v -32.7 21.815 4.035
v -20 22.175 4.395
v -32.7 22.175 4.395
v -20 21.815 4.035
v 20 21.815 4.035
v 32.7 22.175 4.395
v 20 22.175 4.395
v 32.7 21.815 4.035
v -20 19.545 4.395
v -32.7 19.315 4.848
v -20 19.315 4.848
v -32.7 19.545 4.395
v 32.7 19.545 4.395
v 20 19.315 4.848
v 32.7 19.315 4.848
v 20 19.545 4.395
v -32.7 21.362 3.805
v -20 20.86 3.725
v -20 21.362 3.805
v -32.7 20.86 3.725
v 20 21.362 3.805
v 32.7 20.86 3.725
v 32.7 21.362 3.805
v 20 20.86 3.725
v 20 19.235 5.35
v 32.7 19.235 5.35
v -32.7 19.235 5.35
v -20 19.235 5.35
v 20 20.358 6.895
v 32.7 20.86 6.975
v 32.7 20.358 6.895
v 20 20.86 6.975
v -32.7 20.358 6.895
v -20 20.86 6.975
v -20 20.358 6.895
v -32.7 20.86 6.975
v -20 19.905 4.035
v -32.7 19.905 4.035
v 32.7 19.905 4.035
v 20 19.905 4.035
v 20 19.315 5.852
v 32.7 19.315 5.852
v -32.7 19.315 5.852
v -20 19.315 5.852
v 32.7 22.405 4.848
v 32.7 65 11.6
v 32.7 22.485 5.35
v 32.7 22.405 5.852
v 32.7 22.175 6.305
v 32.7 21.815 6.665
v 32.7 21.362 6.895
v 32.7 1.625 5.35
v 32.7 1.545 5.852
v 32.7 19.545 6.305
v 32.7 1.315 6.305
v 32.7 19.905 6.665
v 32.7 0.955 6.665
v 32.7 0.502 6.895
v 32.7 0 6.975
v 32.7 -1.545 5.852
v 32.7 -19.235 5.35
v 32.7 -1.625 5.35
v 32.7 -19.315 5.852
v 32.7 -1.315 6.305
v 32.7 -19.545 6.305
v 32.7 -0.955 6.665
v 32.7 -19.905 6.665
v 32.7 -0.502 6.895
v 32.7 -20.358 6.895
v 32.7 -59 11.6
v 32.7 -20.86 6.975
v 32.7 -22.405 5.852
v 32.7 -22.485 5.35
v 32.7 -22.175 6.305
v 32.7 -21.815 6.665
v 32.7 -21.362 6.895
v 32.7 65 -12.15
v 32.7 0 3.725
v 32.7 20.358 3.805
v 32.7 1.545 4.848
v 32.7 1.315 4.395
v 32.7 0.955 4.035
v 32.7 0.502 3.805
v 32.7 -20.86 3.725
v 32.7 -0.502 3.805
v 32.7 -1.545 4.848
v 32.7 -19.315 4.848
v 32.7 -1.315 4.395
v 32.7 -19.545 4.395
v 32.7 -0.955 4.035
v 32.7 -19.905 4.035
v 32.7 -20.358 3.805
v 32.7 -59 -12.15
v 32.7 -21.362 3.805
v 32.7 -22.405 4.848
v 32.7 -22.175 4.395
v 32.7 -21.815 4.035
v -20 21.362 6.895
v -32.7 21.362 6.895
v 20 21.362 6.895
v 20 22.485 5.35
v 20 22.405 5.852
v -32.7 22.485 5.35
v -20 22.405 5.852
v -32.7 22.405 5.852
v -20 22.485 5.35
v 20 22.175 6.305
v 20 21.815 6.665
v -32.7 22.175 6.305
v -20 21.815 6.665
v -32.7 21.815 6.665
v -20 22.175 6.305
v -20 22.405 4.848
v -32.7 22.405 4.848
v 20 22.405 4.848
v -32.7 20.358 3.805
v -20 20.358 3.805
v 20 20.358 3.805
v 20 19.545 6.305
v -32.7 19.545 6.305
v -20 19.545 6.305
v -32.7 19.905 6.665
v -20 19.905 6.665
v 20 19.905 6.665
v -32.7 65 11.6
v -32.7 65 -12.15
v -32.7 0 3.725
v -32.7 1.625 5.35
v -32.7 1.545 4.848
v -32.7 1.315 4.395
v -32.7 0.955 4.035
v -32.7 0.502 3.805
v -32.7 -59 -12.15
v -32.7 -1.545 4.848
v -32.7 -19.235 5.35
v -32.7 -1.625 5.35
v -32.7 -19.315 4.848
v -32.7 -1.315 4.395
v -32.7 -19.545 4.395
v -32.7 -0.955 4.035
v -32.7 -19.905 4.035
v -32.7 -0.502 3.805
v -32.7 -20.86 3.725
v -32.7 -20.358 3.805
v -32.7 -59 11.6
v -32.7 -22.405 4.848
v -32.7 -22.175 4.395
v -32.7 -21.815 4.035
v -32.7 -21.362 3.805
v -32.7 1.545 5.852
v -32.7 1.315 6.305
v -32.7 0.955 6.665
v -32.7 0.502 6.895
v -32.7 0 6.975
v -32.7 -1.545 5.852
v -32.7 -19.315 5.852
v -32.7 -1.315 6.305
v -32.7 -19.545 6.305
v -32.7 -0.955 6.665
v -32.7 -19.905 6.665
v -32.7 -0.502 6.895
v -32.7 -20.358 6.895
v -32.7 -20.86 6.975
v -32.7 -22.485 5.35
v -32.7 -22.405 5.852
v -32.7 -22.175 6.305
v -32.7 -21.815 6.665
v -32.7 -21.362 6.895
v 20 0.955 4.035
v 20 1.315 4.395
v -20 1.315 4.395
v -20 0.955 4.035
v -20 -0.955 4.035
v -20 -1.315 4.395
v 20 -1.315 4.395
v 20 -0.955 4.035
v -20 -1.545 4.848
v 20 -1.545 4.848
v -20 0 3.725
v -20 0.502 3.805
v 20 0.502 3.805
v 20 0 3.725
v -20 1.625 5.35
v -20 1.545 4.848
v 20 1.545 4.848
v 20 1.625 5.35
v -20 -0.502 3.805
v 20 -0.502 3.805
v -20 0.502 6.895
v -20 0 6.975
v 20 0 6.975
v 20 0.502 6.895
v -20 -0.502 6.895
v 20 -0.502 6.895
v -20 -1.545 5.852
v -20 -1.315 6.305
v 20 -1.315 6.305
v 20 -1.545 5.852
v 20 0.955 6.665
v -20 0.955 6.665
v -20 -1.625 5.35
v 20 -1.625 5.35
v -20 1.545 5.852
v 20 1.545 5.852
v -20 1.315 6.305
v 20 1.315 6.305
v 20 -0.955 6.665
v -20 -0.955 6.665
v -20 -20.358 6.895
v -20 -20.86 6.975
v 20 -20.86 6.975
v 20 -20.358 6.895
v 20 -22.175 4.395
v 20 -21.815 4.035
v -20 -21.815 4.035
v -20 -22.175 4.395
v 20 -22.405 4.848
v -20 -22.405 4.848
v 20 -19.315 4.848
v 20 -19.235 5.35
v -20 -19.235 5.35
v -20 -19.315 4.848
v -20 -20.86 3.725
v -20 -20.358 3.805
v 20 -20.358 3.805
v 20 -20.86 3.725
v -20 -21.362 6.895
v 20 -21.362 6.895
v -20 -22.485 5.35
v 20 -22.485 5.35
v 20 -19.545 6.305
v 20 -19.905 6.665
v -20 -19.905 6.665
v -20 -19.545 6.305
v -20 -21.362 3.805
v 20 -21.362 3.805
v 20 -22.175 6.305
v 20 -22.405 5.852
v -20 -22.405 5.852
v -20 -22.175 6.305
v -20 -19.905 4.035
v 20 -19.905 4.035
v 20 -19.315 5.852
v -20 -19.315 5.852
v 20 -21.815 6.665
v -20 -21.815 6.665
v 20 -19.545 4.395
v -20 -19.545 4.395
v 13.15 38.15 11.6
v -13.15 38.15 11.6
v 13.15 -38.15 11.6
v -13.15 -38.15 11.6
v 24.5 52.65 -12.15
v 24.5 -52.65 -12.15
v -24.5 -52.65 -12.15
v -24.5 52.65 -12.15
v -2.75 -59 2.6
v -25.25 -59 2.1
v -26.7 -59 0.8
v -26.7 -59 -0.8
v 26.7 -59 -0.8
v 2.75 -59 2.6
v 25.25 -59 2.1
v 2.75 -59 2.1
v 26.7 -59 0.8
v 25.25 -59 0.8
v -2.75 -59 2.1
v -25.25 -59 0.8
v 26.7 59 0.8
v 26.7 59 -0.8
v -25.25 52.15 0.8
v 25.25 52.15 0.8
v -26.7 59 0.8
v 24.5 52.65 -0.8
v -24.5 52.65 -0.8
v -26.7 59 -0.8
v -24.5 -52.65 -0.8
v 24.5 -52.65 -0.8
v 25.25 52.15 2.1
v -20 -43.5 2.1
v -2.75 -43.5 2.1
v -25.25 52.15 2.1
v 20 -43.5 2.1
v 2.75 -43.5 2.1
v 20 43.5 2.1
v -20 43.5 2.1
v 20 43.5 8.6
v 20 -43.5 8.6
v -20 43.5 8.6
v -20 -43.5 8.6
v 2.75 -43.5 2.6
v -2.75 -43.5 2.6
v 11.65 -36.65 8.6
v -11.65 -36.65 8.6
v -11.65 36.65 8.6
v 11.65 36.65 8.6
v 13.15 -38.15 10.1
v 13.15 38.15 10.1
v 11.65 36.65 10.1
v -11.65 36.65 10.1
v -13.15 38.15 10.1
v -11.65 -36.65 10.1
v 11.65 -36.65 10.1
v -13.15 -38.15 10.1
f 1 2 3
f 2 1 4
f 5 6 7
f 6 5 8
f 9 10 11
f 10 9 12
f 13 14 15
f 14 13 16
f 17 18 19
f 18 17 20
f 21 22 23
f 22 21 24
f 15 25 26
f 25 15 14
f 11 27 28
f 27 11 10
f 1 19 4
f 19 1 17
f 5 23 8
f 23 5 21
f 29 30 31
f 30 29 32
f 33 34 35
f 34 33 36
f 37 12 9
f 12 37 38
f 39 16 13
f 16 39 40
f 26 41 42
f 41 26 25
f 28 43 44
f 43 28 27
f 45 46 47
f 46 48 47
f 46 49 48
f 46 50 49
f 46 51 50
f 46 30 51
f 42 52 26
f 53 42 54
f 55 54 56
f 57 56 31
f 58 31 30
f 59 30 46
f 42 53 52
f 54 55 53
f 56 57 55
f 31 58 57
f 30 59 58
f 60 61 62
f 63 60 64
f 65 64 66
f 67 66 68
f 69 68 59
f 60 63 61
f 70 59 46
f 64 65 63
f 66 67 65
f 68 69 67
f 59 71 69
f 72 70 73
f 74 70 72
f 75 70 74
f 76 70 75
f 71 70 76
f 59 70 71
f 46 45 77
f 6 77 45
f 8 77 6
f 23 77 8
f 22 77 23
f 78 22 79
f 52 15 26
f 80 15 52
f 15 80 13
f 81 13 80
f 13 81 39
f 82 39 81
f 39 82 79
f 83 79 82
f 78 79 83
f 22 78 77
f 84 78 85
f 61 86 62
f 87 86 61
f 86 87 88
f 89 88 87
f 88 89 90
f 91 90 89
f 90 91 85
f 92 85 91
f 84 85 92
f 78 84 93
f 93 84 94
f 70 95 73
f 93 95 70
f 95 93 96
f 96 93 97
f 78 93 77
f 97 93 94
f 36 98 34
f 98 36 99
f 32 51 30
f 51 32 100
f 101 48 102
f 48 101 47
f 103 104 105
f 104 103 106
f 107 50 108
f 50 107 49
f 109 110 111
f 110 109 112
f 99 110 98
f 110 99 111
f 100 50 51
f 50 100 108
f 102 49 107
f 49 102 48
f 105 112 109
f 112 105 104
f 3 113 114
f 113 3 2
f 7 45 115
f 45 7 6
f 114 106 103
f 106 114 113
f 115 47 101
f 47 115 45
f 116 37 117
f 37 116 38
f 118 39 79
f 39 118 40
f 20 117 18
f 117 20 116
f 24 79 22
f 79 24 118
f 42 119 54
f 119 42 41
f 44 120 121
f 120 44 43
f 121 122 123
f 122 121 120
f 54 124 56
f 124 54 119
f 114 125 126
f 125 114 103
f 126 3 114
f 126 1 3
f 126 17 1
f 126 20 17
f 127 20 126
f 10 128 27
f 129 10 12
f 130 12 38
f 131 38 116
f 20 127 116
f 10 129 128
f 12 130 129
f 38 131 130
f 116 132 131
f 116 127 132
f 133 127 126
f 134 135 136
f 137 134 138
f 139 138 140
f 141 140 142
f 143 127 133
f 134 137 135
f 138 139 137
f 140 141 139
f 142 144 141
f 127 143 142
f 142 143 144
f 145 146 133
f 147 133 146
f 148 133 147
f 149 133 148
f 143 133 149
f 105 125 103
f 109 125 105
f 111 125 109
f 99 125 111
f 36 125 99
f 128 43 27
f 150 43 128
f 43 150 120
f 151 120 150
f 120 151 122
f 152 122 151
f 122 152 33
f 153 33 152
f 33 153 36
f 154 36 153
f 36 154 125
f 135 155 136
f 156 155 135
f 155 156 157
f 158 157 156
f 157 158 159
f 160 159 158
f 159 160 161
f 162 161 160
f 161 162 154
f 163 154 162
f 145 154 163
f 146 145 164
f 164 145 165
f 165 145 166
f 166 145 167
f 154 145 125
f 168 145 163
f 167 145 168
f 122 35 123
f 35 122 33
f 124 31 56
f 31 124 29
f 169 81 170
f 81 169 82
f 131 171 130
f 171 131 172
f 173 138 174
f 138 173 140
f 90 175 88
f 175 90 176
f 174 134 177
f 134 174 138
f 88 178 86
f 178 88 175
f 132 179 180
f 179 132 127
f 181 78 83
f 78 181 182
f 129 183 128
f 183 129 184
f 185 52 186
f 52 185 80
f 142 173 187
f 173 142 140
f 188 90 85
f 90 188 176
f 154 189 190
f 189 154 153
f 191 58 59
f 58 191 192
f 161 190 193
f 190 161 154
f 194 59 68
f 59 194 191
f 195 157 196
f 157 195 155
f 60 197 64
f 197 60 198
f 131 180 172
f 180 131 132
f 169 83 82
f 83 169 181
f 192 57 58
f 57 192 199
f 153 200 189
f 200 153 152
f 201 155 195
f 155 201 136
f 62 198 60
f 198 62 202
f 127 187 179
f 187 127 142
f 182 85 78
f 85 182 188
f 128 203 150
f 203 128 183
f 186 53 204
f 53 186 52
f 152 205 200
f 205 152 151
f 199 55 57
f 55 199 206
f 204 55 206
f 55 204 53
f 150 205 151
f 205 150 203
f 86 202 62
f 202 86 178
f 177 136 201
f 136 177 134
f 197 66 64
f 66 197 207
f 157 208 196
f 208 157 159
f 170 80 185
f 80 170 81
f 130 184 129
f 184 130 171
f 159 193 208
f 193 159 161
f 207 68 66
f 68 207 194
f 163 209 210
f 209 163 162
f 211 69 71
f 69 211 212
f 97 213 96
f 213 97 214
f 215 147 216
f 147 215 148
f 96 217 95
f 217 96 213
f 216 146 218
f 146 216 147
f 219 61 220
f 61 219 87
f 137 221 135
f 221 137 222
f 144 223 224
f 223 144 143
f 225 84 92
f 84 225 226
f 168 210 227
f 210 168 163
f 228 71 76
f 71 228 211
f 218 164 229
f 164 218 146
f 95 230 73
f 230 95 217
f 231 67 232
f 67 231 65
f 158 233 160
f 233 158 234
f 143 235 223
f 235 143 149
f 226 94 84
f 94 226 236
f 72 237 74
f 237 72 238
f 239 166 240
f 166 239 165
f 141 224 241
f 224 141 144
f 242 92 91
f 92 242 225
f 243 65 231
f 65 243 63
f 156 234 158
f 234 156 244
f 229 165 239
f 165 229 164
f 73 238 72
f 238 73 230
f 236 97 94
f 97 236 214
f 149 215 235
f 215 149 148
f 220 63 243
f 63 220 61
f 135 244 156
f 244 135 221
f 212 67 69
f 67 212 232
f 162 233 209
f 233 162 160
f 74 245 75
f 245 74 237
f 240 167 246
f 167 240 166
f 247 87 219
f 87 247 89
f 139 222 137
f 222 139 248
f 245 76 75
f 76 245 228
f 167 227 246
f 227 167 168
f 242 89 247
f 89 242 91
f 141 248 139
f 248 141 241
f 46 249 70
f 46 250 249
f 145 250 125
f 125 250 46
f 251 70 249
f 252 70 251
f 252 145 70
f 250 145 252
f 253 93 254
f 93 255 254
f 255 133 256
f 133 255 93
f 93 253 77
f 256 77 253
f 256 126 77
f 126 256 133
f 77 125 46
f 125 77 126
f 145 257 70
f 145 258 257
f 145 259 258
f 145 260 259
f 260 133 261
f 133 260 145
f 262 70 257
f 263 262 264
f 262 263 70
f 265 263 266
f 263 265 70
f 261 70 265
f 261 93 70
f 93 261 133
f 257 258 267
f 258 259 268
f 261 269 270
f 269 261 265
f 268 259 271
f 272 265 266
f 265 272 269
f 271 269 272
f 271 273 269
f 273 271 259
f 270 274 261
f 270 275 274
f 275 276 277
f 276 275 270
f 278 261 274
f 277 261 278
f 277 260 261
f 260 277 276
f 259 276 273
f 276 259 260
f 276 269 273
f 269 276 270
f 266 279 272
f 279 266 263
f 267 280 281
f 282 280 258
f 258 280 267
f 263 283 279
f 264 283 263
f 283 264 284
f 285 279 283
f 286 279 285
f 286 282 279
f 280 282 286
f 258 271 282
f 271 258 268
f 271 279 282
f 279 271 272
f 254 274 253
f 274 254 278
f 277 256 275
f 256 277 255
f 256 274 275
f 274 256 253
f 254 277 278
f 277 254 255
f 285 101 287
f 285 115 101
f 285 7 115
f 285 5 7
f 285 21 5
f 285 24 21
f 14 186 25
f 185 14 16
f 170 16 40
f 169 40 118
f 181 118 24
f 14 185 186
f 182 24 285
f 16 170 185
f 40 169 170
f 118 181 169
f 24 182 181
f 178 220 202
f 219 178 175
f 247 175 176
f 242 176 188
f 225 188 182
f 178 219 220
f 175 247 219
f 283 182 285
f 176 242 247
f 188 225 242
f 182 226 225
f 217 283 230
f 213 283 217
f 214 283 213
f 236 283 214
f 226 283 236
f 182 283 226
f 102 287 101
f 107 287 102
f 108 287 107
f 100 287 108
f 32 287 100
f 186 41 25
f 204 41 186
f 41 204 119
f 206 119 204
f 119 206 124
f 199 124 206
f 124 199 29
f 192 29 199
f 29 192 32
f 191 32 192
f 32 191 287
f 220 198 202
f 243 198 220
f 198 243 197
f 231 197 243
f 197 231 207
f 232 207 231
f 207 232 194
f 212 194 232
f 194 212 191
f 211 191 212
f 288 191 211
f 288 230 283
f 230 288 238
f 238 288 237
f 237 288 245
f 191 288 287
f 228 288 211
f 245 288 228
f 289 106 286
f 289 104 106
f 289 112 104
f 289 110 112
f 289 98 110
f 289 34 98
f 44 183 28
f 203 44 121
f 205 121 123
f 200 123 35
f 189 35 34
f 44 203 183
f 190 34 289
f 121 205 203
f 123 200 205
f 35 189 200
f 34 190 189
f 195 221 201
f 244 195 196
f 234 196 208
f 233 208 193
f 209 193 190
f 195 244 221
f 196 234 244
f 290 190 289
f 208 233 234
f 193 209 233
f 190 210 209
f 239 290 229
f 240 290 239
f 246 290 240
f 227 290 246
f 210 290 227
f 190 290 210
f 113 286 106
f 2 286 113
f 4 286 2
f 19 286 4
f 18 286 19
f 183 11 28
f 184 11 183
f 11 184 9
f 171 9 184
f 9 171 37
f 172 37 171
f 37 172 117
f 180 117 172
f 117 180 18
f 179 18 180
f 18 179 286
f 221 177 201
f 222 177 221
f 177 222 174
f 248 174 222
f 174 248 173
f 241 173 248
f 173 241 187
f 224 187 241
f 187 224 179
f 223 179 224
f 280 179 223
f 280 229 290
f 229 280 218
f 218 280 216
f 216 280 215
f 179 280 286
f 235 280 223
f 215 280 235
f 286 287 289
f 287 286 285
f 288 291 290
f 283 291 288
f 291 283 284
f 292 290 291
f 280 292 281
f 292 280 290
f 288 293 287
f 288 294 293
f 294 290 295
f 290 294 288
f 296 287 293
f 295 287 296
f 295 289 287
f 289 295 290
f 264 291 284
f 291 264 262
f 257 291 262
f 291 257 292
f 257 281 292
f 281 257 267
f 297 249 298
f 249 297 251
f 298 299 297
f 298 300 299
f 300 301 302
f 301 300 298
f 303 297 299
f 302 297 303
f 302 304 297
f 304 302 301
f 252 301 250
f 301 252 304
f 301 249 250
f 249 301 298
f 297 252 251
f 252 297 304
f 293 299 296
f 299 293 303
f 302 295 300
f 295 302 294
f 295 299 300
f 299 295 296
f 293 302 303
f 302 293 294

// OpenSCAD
cdXtol = 0.3; //ceramic dimension X tolerance
cdYtol = 0.0; //ceramic dimension Y tolerance
cdZtol = 0.2; //ceramic dimension Z tolerance
cdX = 53.1+cdXtol; //ceramic dimension X
cdY = 118+cdYtol; //ceramic dimension Y
cdZ = 1.4+cdZtol; //ceramic dimension Z

ndXtol = 0.4; //net base dimension X tolerance
ndYtol = 0.5; //net base dimension Y tolerance
ndZtol = 0.2; //net base dimension Z tolerance
ndX = 50.1+ndXtol; //net base dimension X
ndY = 103.8+ndYtol; //net base dimension Y
ndZ = 1.1+ndZtol; //net base dimension Z

glasdXtol = 0.3; //glass window dimension X tolerance
glasdYtol = 0.3; //glass window dimension Y tolerance
glasdZtol = 0.0; //glass window dimension Z tolerance
glasdX = 26+glasdXtol; //glass window dimension X
glasdY = 76+glasdYtol; //glass window dimension Y
glasdZ = 1+glasdZtol; //glass window dimension Z

gdXtol = 0;// ground dimension Z tolerance
gdZ = 10.35+1+gdXtol; //ground dimension Z

uct = 9.5; //upper chamber thickness
sct = 6; //side chamber thickness

pdZ = 3; //plexi dimension Z

module ceramic() {
    color("Gainsboro") cube([cdX,cdY,cdZ], center=true); 
}

module netbase() {
    translate([0,0,cdZ/2+ndZ/2])
    color("SandyBrown") cube([ndX,ndY,ndZ], center=true); 
}

module gnd() {
    translate([0,0,-cdZ/2-gdZ/2])
    color("DarkKhaki") cube([49,105.3,gdZ], center=true);     
}

module visible() {
    translate([0,0,cdZ/2+ndZ+uct/2])
    color("Red") cube([40,87,uct], center=true); 
}

module plexi() {
    translate([0,0,cdZ/2+ndZ+uct-pdZ/2])
    color("Red") cube([ndX*1.1,ndY*1.05,pdZ], center=true); 
}

module glassWindowFrame() {
    translate([0,0,cdZ/2+ndZ+uct-0])
    color("Red") cube([glasdX,glasdY,pdZ], center=true); 
}

module glassWindow() {
    translate([0,0,cdZ/2+ndZ+uct-pdZ/2])
    color("Red") cube([glasdX-3,glasdY-3,pdZ], center=true); 
}
module box() {
    translate([0,sct/2,-cdZ/2-gdZ+(cdZ+ndZ+gdZ+uct)/2])
    color("Green") cube([cdX+2*sct,cdY+sct,cdZ+ndZ+gdZ+uct], center=true); 
}

module electCav() {
    translate([0,-(cdY)/4,cdZ/2+ndZ+0.5/2])
    color("Red") cube([5.5,(cdY)/2,0.5], center=true); 
}

module prism(l, w, h){
       rotate([90,0,90])translate([-l/2,-w/2,-h/2]) polyhedron(
               points=[[0,0,0], [l,0,0], [l,w,0], [0,w,0], [3*l/8,0,h], [5*l/8,0,h],
    [5*l/8,w,h], [3*l/8,w,h]],
               faces=[[0,1,2,3], [4,7,6,5], [0,3,7,4], [2,6,7,3], [1,5,6,2], [0,4,5,1]] 
               );
}

module prismCut() {    
    union(){
        translate([(cdX+2*sct-ndY*0.8)/8+ndX*0.4,0,cdZ/2+ndZ+(uct-pdZ)/2])
        prism(ndY*0.64,(uct-pdZ)/2,(cdX+2*sct-ndY*0.8)/4);
        
        mirror([1,0,0])
        translate([(cdX+2*sct-ndY*0.8)/8+ndX*0.4,0,cdZ/2+ndZ+(uct-pdZ)/2])
        prism(ndY*0.64,(uct-pdZ)/2,(cdX+2*sct-ndY*0.8)/4);
        
        translate([0,0,cdZ/2+ndZ+(uct-pdZ)/2])
        rotate([0,90,0])
        cylinder(  cdX+2*sct, d=(uct-pdZ)/2, center=true, $fn=20);
        }
    
}

module holes() {
    translate([0,ndY*0.8/4,cdZ/2+ndZ+(uct-pdZ)/2])
    rotate([0,90,0])
    cylinder(  cdX+2*sct, d=(uct-pdZ)/2, center=true, $fn=20);
    
    translate([0,0,cdZ/2+ndZ+(uct-pdZ)/2])
    rotate([0,90,0])
    cylinder(  cdX+2*sct, d=(uct-pdZ)/2, center=true, $fn=20);
    
    translate([0,-ndY*0.8/4,cdZ/2+ndZ+(uct-pdZ)/2])
    rotate([0,90,0])
    cylinder(  cdX+2*sct, d=(uct-pdZ)/2, center=true, $fn=20);
    
}
module frame() {
    difference(){
        box();
        ceramic();        
        netbase();
        translate([0,-ndY,0]) netbase();
        gnd();
        visible();
        plexi();
        electCav();
        //uncomment one of those
        //prismCut();
        holes();        
        }    
    }

module frameCovered() {
    union(){
        frame();
        plexi();
        }
    }
module frameCoveredGlassWindow() {
    difference(){
        frameCovered();
        glassWindowFrame();
        glassWindow();
        }
    }
frameCoveredGlassWindow();
    
//electCav();
//ceramic();
//netbase();
//gnd();
//visible();
//box();
